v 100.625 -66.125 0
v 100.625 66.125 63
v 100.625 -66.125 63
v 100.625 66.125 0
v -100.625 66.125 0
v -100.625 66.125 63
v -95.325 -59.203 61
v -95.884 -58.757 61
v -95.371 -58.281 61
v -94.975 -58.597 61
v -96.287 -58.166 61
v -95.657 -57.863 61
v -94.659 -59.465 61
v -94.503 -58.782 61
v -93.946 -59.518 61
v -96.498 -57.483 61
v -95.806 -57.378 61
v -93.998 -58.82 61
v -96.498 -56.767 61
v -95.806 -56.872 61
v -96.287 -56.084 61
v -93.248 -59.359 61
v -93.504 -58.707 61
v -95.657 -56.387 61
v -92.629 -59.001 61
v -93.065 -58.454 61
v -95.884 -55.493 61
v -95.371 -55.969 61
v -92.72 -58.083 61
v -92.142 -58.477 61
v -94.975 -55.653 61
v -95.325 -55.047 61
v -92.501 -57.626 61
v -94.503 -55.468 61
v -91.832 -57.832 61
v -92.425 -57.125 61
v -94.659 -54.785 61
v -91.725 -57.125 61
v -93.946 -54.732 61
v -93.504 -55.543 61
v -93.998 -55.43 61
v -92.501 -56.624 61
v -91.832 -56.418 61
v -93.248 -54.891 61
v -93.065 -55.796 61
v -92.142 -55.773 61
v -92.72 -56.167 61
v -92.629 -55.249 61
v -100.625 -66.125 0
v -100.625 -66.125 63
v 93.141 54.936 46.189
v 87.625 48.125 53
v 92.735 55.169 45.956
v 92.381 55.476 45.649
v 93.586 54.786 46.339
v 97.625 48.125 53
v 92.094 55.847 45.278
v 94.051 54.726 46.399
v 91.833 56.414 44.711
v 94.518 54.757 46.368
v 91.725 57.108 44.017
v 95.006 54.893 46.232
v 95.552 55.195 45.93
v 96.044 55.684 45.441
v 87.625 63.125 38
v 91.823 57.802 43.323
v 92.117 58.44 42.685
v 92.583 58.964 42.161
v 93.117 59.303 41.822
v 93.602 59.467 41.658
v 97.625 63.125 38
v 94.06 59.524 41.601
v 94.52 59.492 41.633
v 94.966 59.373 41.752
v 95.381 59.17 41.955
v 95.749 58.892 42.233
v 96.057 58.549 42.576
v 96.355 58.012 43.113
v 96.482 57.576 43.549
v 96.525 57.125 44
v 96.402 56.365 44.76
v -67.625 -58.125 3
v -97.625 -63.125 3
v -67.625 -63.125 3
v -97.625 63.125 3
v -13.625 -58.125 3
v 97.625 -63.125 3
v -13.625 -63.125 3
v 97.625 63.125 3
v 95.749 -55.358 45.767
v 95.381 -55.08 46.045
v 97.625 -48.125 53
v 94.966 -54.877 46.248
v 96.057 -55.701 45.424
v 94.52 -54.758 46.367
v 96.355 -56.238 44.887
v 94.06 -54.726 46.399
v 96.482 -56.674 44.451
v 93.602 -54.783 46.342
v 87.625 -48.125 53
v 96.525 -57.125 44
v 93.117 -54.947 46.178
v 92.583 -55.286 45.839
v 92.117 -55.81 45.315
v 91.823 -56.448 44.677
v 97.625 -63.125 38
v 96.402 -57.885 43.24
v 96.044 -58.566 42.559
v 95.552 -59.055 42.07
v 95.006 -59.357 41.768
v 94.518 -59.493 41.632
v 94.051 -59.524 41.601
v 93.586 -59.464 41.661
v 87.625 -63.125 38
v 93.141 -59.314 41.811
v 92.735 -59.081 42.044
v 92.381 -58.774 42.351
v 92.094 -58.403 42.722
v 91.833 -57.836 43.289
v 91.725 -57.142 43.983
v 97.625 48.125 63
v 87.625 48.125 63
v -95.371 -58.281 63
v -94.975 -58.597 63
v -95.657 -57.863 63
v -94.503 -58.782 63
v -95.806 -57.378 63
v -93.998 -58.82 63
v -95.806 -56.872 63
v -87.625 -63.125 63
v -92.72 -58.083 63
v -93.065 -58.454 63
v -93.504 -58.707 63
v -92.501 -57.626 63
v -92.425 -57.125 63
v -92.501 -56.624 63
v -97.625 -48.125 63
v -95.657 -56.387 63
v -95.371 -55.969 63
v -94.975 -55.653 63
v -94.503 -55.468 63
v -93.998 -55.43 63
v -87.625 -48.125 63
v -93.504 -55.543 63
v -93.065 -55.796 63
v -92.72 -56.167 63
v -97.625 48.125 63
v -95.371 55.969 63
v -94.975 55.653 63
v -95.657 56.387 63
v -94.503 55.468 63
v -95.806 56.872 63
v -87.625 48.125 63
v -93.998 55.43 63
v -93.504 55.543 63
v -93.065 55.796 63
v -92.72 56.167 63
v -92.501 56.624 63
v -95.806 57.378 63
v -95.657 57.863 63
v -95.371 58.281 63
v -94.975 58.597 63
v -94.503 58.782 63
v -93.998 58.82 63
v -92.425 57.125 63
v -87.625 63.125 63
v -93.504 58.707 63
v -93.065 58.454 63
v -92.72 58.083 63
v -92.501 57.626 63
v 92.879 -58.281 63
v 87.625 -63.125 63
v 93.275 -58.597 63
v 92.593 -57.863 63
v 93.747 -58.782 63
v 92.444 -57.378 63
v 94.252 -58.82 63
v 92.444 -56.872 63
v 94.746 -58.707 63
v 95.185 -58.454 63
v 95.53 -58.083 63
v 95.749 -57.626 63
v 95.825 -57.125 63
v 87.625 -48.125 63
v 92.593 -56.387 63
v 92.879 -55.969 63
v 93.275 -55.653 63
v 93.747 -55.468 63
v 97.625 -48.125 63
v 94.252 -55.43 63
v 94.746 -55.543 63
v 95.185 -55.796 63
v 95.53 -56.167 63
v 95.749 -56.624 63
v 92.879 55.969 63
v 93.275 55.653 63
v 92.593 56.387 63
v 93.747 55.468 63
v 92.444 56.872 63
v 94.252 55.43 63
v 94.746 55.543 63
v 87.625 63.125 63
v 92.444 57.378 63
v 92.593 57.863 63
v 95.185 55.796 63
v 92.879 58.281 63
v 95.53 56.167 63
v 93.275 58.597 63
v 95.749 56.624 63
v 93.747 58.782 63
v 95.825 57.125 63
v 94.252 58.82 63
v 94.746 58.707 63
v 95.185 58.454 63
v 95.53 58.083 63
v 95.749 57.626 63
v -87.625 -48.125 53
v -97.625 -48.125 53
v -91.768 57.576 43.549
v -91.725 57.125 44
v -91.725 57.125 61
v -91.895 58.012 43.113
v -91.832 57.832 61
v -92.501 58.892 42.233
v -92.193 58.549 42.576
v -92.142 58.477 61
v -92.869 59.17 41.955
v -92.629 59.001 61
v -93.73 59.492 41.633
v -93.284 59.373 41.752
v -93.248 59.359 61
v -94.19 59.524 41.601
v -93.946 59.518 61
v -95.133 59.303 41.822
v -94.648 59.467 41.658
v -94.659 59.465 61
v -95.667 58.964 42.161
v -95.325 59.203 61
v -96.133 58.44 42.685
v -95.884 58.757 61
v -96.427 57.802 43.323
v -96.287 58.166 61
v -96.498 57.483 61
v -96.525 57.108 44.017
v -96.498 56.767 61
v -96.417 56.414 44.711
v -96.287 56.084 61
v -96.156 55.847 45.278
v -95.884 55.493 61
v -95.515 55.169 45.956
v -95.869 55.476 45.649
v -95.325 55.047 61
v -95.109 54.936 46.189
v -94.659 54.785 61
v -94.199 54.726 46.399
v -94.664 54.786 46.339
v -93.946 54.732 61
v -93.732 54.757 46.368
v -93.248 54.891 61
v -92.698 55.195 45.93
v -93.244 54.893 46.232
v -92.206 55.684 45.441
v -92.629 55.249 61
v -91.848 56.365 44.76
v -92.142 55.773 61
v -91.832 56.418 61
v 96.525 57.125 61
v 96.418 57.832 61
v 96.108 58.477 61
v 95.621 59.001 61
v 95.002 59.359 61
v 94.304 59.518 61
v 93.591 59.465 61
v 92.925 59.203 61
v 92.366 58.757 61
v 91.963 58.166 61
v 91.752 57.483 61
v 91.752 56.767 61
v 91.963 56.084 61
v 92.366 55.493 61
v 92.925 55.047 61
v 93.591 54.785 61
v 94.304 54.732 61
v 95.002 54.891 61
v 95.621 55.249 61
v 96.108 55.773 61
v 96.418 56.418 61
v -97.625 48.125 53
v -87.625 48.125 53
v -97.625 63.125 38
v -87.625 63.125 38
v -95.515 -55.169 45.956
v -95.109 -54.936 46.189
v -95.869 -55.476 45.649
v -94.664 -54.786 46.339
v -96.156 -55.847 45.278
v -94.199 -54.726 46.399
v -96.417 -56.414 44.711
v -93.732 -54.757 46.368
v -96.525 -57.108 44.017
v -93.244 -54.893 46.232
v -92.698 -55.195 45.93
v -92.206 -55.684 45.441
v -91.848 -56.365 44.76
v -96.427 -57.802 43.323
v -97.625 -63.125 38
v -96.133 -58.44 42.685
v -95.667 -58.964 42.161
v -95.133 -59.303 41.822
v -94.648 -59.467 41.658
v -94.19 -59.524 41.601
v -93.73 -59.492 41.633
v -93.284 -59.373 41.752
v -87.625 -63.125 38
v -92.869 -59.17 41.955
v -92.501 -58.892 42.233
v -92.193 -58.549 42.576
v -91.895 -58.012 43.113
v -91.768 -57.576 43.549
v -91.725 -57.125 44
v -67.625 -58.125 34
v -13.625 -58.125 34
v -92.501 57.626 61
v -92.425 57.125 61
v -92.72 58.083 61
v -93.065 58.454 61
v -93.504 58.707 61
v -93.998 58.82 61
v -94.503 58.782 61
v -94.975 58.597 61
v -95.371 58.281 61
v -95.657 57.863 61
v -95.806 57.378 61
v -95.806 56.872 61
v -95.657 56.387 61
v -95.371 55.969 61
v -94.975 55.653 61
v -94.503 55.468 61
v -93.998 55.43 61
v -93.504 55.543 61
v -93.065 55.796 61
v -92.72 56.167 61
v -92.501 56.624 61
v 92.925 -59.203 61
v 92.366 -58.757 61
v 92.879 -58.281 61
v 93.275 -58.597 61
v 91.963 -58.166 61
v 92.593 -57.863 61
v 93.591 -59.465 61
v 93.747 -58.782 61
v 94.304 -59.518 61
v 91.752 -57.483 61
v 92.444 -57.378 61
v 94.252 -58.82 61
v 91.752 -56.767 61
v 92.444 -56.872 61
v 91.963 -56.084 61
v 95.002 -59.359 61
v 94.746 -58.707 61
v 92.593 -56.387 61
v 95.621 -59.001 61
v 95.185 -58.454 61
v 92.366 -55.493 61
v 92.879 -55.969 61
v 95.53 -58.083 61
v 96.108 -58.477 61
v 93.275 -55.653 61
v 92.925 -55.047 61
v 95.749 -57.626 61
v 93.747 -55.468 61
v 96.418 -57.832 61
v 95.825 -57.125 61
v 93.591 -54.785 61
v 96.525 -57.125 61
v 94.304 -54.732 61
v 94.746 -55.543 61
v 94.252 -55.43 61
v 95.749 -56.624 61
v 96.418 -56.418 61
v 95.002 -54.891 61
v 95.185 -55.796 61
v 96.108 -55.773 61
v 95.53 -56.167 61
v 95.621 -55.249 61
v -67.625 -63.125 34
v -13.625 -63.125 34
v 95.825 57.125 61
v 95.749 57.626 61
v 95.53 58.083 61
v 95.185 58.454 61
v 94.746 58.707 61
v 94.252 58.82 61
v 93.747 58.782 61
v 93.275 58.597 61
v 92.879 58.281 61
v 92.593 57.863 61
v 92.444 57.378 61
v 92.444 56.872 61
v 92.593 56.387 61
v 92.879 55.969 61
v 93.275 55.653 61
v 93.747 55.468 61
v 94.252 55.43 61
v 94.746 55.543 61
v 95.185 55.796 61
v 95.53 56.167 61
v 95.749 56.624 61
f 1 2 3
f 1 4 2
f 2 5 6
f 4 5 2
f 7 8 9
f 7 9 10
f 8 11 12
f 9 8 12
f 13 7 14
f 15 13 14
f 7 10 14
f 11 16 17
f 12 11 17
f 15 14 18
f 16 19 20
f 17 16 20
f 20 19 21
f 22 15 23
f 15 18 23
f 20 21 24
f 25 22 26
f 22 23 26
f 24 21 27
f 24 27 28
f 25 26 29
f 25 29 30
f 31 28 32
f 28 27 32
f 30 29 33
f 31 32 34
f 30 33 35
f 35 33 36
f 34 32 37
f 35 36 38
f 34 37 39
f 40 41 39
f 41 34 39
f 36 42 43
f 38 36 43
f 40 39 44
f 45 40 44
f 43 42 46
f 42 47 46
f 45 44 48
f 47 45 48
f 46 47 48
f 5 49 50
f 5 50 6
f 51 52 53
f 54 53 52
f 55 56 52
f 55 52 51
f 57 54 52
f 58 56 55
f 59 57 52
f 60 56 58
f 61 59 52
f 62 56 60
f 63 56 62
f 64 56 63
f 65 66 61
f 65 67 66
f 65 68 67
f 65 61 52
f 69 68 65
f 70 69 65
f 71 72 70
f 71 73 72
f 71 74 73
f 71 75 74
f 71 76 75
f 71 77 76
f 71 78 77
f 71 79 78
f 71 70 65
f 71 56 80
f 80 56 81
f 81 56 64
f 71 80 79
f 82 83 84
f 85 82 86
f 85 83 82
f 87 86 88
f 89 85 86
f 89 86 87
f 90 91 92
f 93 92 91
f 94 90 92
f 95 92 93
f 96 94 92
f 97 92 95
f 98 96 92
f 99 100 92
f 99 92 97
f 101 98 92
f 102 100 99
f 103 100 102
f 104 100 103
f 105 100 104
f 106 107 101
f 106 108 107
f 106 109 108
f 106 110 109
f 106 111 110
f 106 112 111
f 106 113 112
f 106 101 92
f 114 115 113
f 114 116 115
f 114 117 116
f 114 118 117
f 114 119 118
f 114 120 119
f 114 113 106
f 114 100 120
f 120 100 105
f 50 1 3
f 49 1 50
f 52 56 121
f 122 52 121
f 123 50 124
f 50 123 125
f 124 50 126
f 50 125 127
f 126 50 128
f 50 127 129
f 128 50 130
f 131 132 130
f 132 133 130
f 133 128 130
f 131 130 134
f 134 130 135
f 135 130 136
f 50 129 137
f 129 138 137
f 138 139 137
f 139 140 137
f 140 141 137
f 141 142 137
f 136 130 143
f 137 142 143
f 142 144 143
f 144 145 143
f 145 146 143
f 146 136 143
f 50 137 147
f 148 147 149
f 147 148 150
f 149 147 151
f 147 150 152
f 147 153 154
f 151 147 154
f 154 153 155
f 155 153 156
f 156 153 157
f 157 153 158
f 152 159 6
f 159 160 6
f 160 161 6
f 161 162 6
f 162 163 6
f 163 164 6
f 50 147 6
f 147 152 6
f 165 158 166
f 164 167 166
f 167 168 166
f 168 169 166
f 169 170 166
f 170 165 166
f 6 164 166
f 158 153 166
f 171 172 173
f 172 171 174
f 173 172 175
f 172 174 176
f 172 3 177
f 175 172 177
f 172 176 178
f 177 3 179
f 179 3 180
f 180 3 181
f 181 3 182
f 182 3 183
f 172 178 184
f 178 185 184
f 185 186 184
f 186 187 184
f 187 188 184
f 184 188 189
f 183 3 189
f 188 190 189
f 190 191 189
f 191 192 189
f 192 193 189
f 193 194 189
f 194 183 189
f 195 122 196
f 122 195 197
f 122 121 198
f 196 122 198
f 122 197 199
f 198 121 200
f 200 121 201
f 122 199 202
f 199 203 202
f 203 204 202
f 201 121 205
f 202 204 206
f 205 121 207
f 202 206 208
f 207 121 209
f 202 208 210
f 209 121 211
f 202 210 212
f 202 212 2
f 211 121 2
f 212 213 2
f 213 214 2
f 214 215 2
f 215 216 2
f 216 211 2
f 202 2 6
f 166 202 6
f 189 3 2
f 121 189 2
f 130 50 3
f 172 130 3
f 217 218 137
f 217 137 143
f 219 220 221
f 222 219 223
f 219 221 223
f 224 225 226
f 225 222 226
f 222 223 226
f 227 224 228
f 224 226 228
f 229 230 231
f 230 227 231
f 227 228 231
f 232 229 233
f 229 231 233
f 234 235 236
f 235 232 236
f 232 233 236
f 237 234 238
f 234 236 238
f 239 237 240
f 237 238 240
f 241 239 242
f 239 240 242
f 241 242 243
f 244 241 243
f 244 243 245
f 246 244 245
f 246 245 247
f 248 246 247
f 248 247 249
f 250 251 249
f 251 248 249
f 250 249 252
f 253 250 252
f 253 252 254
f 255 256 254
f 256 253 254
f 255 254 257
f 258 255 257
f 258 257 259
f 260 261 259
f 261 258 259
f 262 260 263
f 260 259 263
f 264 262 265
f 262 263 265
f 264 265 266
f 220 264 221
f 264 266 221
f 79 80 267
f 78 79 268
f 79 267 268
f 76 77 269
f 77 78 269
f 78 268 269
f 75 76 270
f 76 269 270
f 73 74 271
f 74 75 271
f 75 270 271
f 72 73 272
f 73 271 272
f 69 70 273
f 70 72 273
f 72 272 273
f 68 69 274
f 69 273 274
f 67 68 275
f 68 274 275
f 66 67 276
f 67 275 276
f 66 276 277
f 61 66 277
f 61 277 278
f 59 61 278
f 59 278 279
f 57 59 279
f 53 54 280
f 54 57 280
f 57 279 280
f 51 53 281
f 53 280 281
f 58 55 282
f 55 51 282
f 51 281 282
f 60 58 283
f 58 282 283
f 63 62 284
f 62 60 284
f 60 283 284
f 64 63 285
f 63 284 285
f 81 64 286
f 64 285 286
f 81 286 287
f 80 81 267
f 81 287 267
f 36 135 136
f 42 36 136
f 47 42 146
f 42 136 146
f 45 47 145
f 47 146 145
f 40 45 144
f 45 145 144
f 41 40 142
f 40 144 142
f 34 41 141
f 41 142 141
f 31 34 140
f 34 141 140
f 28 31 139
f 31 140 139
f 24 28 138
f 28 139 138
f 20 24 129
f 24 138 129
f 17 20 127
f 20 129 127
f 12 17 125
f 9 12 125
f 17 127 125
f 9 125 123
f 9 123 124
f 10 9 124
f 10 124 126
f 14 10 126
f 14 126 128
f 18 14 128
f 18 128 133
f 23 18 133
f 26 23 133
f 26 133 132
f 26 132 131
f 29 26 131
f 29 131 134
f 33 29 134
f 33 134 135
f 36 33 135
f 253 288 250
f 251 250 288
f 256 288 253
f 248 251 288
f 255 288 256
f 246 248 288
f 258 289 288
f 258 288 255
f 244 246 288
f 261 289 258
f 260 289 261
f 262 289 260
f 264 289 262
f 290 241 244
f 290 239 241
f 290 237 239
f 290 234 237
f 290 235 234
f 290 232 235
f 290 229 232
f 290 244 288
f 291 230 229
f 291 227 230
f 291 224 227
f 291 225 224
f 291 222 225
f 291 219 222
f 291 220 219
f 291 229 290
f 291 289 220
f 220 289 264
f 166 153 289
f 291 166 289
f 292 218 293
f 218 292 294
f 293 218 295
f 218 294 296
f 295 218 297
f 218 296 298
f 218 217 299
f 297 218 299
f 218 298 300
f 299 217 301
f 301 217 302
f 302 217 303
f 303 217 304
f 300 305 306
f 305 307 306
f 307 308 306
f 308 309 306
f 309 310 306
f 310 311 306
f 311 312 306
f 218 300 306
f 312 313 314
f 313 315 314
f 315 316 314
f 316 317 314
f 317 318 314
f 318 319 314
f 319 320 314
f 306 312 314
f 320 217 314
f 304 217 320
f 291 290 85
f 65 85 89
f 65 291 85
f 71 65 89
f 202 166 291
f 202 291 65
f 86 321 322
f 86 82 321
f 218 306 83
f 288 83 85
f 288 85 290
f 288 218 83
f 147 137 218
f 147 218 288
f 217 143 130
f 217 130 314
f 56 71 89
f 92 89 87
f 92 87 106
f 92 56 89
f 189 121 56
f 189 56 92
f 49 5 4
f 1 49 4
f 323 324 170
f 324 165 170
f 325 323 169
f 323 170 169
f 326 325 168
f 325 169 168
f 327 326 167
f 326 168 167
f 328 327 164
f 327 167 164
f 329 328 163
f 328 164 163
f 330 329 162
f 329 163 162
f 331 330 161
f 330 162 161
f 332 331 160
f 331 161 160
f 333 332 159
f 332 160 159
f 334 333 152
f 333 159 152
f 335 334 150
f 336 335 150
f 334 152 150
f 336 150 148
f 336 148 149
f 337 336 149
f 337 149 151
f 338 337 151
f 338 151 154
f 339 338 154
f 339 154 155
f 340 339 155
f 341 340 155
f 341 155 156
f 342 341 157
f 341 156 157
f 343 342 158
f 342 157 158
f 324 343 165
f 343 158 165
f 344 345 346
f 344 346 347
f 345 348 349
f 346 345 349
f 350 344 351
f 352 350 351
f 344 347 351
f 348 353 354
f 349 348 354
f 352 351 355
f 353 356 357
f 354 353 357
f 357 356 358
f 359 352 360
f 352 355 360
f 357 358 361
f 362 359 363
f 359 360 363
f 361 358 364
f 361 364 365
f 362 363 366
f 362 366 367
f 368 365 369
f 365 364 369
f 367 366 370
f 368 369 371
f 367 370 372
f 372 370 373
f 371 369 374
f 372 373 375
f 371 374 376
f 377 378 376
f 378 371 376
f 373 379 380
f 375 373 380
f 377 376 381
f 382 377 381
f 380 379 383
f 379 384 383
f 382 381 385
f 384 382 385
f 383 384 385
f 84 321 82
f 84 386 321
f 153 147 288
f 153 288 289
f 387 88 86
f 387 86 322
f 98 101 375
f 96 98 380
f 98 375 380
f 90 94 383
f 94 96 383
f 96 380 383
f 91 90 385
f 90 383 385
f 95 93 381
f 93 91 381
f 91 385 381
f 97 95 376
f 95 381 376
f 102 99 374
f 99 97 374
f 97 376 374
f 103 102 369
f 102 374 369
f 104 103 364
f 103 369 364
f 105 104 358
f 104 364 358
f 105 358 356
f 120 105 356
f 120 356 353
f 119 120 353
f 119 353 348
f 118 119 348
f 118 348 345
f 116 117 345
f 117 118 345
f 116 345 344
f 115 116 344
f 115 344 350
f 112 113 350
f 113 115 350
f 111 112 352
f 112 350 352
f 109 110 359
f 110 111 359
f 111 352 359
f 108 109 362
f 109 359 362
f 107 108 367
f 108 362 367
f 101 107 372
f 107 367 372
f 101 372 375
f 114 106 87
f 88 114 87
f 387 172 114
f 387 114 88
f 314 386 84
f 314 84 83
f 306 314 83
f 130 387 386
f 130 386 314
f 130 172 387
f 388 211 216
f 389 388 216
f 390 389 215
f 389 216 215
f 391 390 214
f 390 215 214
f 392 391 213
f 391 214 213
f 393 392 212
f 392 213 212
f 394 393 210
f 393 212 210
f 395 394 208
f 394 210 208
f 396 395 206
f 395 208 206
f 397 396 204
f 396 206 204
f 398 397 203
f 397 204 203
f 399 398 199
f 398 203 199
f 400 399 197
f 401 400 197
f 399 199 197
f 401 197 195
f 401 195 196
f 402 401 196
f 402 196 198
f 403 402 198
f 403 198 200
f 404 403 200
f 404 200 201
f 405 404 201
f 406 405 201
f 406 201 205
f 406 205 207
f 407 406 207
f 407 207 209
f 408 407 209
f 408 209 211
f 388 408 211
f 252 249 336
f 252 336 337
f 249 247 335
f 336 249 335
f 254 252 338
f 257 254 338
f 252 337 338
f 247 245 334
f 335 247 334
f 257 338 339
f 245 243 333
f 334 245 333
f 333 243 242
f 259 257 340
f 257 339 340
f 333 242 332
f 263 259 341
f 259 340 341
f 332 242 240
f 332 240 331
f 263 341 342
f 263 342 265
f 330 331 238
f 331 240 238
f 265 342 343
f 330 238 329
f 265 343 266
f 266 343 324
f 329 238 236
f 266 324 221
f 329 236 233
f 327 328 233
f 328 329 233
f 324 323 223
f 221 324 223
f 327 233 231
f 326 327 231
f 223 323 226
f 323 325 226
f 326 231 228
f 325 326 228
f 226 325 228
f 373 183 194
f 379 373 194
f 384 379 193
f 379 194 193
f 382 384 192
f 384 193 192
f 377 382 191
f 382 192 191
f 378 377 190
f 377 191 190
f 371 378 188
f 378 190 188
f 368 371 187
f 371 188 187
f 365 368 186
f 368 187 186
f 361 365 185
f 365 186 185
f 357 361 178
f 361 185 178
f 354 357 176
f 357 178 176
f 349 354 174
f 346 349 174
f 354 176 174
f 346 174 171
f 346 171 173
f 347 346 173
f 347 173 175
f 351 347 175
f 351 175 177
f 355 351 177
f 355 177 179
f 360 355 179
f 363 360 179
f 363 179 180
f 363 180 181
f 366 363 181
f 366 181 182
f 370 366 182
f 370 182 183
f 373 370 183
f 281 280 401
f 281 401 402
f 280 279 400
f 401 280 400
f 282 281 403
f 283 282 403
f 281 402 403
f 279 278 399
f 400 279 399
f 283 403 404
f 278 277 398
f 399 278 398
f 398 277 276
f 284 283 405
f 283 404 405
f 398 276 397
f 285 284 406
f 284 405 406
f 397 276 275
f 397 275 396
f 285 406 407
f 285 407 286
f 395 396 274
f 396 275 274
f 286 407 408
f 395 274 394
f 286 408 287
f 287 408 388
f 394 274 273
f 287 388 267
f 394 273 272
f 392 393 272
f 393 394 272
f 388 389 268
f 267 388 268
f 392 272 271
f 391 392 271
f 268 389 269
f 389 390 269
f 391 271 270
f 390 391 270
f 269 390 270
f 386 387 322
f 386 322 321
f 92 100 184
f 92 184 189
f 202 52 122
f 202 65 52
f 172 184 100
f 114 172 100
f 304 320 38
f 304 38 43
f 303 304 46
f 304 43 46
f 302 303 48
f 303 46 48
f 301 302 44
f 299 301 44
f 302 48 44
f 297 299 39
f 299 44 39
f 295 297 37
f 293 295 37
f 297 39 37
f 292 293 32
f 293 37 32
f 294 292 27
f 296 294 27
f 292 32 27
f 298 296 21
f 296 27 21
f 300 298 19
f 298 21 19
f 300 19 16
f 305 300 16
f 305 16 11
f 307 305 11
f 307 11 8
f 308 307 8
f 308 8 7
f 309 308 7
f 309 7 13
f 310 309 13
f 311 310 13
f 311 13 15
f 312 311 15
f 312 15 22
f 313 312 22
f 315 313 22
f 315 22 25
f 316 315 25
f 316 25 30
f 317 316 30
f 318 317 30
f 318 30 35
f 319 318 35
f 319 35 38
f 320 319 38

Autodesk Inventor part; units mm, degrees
ref_plane "YZ Plane" through (0, 0, 0) normal (1, 0, 0) x (0, 1, 0)
ref_plane "XZ Plane" through (0, 0, 0) normal (0, 1, 0) x (-1, 0, 0)
ref_plane "XY Plane" through (0, 0, 0) normal (0, 0, 1) x (1, 0, 0)
sketch "Sketch7" plane through (0, 0, 0) normal (0, 0, 1) x (1, 0, 0)
  line L0 (100.625, -66.125) -> (-100.625, -66.125)
  line L1 (-100.625, -66.125) -> (-100.625, 66.125)
  line L2 (-100.625, 66.125) -> (100.625, 66.125)
  line L3 (100.625, 66.125) -> (100.625, -66.125)
  line L4 (100.625, -66.125) -> (-100.625, 66.125) construction
  line L5 (-100.625, -66.125) -> (100.625, 66.125) construction
  point P0 (0, 0)
  dimension "d15" = 201.25
  dimension "d16" = 132.25
extrude "Box Outside" add sketch "Sketch7" along normal blind 63
sketch "Sketch8" plane through (0, 0, 63) normal (0, 0, 1) x (1, 0, 0)
  line L0 (-97.625, 63.125) -> (97.625, 63.125)
  line L1 (97.625, 63.125) -> (97.625, -63.125)
  line L2 (97.625, -63.125) -> (-97.625, -63.125)
  line L3 (-97.625, -63.125) -> (-97.625, 63.125)
  line L4 (100.625, 66.125) -> (-100.625, 66.125) projected
  line L5 (-100.625, 66.125) -> (-100.625, -66.125) projected
  line L6 (-100.625, -66.125) -> (100.625, -66.125) projected
  line L7 (100.625, -66.125) -> (100.625, 66.125) projected
  point P0 (0, 0)
  dimension "d19" = 3
  dimension "d20" = 3
  dimension "d21" = 3
  dimension "d22" = 3
extrude "Box Cut" cut sketch "Sketch8" against normal blind 60 contours L0 L1 L2 L3
sketch "Sketch9" plane through (-97.625, -63.125, 63) normal (0, 1, 0) x (1, 0, 0)
  line L0 (0, 0) -> (10, 0)
  line L1 (10, 0) -> (10, 25)
  line L2 (10, 25) -> (0, 25)
  line L3 (0, 25) -> (0, 0)
  point P0 (97.625, 63)
  dimension "d25" = 10
  dimension "d26" = 25
extrude "ScrewHole Box LB" add sketch "Sketch9" along normal blind 15
sketch "Sketch10" plane through (-97.625, -63.125, 3) normal (0, 1, 0) x (1, 0, 0)
  line L0 (195.25, -60) -> (195.25, 0) projected
  line L1 (195.25, -60) -> (185.25, -60)
  line L2 (185.25, -60) -> (185.25, -35)
  line L3 (185.25, -35) -> (195.25, -35)
  line L4 (195.25, -35) -> (195.25, -60)
  point P0 (97.625, 3)
  dimension "d29" = 10
  dimension "d30" = 25
extrude "ScrewHole Box RB" add sketch "Sketch10" along normal blind 15
sketch "Sketch11" plane through (-97.625, 63.125, 63) normal (0, -1, 0) x (1, 0, 0)
  line L0 (0, 0) -> (195.25, 0) projected
  line L1 (0, 0) -> (10, 0)
  line L2 (10, 0) -> (10, -25)
  line L3 (10, -25) -> (0, -25)
  line L4 (0, -25) -> (0, 0)
  point P0 (97.625, -63)
  dimension "d33" = 10
  dimension "d34" = 25
extrude "ScrewHole Box LU" add sketch "Sketch11" along normal blind 15
sketch "Sketch13" plane through (97.625, -63.125, 3) normal (-1, 0, 0) x (0, 0, 1)
  line L0 (60, 126.25) -> (0, 126.25) projected
  line L1 (60, 126.25) -> (35, 126.25)
  line L2 (35, 126.25) -> (35, 111.25)
  line L3 (35, 111.25) -> (60, 111.25)
  line L4 (60, 111.25) -> (60, 126.25)
  point P0 (-3, 63.125)
  dimension "d37" = 25
  dimension "d38" = 15
extrude "ScrewHole Box RU" add sketch "Sketch13" along normal blind 10
sketch "Sketch27" plane through (0, 0, 63) normal (0, 0, 1) x (1, 0, 0)
  line L0 (-87.625, -63.125) -> (-87.625, -48.125) projected
  line L1 (-100.625, 66.125) -> (-100.625, -66.125) projected
  line L2 (-87.625, -48.125) -> (-100.625, -48.125)
  line L3 (-100.625, -48.125) -> (-100.625, -66.125)
  line L4 (-100.625, -66.125) -> (-87.625, -66.125)
  line L5 (-87.625, -66.125) -> (-87.625, -48.125)
  line L6 (-87.625, -48.125) -> (-100.625, -66.125)
  line L7 (-87.625, -66.125) -> (-100.625, -48.125)
  circle A0 centre (-94.125, -57.125) radius 2.4
  point P0 (0, 0)
  dimension "d84" = 4.8
extrude "Outside ScrewHole LB" cut sketch "Sketch27" against normal blind 26 contours A0 L7 L6 | L6 L7 A0 | A0 L6 L7 | L7 L6 A0
sketch "Sketch29" plane through (0, 0, 63) normal (0, 0, 1) x (1, 0, 0)
  line L0 (-87.625, -63.125) -> (-87.625, -48.125) projected
  line L1 (-100.625, -66.125) -> (100.625, -66.125) projected
  line L2 (-87.625, -48.125) -> (-100.625, -48.125)
  line L3 (-100.625, -48.125) -> (-100.625, -66.125)
  line L4 (-100.625, -66.125) -> (-87.625, -66.125)
  line L5 (-87.625, -66.125) -> (-87.625, -48.125)
  line L6 (-87.625, -48.125) -> (-100.625, -66.125)
  circle A0 centre (-94.125, -57.125) radius 2.4
  point P0 (0, 0)
extrude "ScrewRibbon LB" add sketch "Sketch29" against normal blind 2 contours A0 L6 | L6 A0
sketch "Sketch30" plane through (0, 0, 63) normal (0, 0, 1) x (1, 0, 0)
  line L0 (-97.625, -48.125) -> (-87.625, -48.125) projected
  line L1 (-100.625, -66.125) -> (100.625, -66.125) projected
  line L2 (-87.625, -48.125) -> (-100.625, -48.125)
  line L3 (-100.625, -48.125) -> (-100.625, -66.125)
  line L4 (-100.625, -66.125) -> (-87.625, -66.125)
  line L5 (-87.625, -66.125) -> (-87.625, -48.125)
  line L6 (-87.625, -48.125) -> (-100.625, -66.125)
  circle A0 centre (-94.125, -57.125) radius 1.7
  point P0 (0, 0)
  dimension "d92" = 3.4
extrude "Inside ScrewHole LB" cut sketch "Sketch30" against normal blind 24 contours A0 L6 | L6 A0
sketch "Sketch31" plane through (0, 0, 63) normal (0, 0, 1) x (1, 0, 0)
  line L0 (-100.625, 66.125) -> (-100.625, -66.125) projected
  line L1 (-87.625, 48.125) -> (-97.625, 48.125) projected
  line L2 (-100.625, 66.125) -> (-87.625, 66.125)
  line L3 (-87.625, 66.125) -> (-87.625, 48.125)
  line L4 (-87.625, 48.125) -> (-100.625, 48.125)
  line L5 (-100.625, 48.125) -> (-100.625, 66.125)
  line L6 (-100.625, 66.125) -> (-87.625, 48.125)
  circle A0 centre (-94.125, 57.125) radius 2.4
  point P0 (0, 0)
  dimension "d95" = 4.8
extrude "Outside ScrewHole LU" cut sketch "Sketch31" against normal blind 24 contours A0 L6 | L6 A0
sketch "Sketch32" plane through (0, 0, 63) normal (0, 0, 1) x (1, 0, 0)
  line L0 (-97.625, 48.125) -> (-87.625, 48.125) projected
  line L1 (-100.625, 66.125) -> (-100.625, -66.125) projected
  line L2 (-87.625, 48.125) -> (-100.625, 48.125)
  line L3 (-100.625, 48.125) -> (-100.625, 66.125)
  line L4 (-100.625, 66.125) -> (-87.625, 66.125)
  line L5 (-87.625, 66.125) -> (-87.625, 48.125)
  line L6 (-87.625, 66.125) -> (-100.625, 48.125)
  circle A0 centre (-94.125, 57.125) radius 2.4
  point P0 (0, 0)
  dimension "d98" = 4.8
extrude "ScrewRibbon LU" add sketch "Sketch32" against normal blind 2 contours A0 L6 | L6 A0
sketch "Sketch33" plane through (0, 0, 63) normal (0, 0, 1) x (1, 0, 0)
  line L0 (100.625, 66.125) -> (-100.625, 66.125) projected
  line L1 (-87.625, 48.125) -> (-97.625, 48.125) projected
  line L2 (-100.625, 66.125) -> (-87.625, 66.125)
  line L3 (-87.625, 66.125) -> (-87.625, 48.125)
  line L4 (-87.625, 48.125) -> (-100.625, 48.125)
  line L5 (-100.625, 48.125) -> (-100.625, 66.125)
  line L6 (-100.625, 66.125) -> (-87.625, 48.125)
  circle A0 centre (-94.125, 57.125) radius 1.7
  point P0 (0, 0)
  dimension "d101" = 3.4
extrude "Inside ScrewHole LU" cut sketch "Sketch33" against normal blind 21.75 contours A0 L6 | L6 A0
sketch "Sketch34" plane through (0, 0, 63) normal (0, 0, 1) x (1, 0, 0)
  line L0 (87.625, 48.125) -> (87.625, 63.125) projected
  line L1 (100.625, 66.125) -> (-100.625, 66.125) projected
  line L2 (87.625, 48.125) -> (100.625, 48.125)
  line L3 (100.625, 48.125) -> (100.625, 66.125)
  line L4 (100.625, 66.125) -> (87.625, 66.125)
  line L5 (87.625, 66.125) -> (87.625, 48.125)
  line L6 (100.625, 66.125) -> (87.625, 48.125)
  circle A0 centre (94.125, 57.125) radius 2.4
  point P0 (0, 0)
  dimension "d104" = 4.8
extrude "Outside ScrewHole RU" cut sketch "Sketch34" against normal blind 37 contours A0 L6 | L6 A0
sketch "Sketch35" plane through (0, 0, 63) normal (0, 0, 1) x (1, 0, 0)
  line L0 (100.625, -66.125) -> (100.625, 66.125) projected
  line L1 (97.625, 48.125) -> (87.625, 48.125) projected
  line L2 (100.625, 66.125) -> (87.625, 66.125)
  line L3 (87.625, 66.125) -> (87.625, 48.125)
  line L4 (87.625, 48.125) -> (100.625, 48.125)
  line L5 (100.625, 48.125) -> (100.625, 66.125)
  line L6 (100.625, 66.125) -> (-100.625, 66.125) projected
  line L7 (100.625, 66.125) -> (87.625, 48.125)
  circle A0 centre (94.125, 57.125) radius 2.4
  point P0 (0, 0)
  dimension "d107" = 4.8
extrude "ScrewRibbon RU" add sketch "Sketch35" against normal blind 2 contours A0 L7 | L7 A0
sketch "Sketch36" plane through (0, 0, 63) normal (0, 0, 1) x (1, 0, 0)
  line L0 (97.625, 48.125) -> (87.625, 48.125) projected
  line L1 (100.625, -66.125) -> (100.625, 66.125) projected
  line L2 (87.625, 48.125) -> (100.625, 48.125)
  line L3 (100.625, 48.125) -> (100.625, 66.125)
  line L4 (100.625, 66.125) -> (87.625, 66.125)
  line L5 (87.625, 66.125) -> (87.625, 48.125)
  line L6 (87.625, 48.125) -> (100.625, 66.125)
  circle A0 centre (94.125, 57.125) radius 2.4 projected
  circle A1 centre (94.125, 57.125) radius 1.7
  point P0 (0, 0)
  dimension "d110" = 3.4
extrude "Inside ScrewHole RU" cut sketch "Sketch36" against normal blind 20 contours A1 L6 | L6 A1
sketch "Sketch37" plane through (0, 0, 63) normal (0, 0, 1) x (1, 0, 0)
  line L0 (100.625, -66.125) -> (100.625, 66.125) projected
  line L1 (87.625, -63.125) -> (87.625, -48.125) projected
  line L2 (100.625, -66.125) -> (87.625, -66.125)
  line L3 (87.625, -66.125) -> (87.625, -48.125)
  line L4 (87.625, -48.125) -> (100.625, -48.125)
  line L5 (100.625, -48.125) -> (100.625, -66.125)
  line L6 (87.625, -66.125) -> (100.625, -48.125)
  circle A0 centre (94.125, -57.125) radius 2.4
  point P0 (0, 0)
  dimension "d113" = 4.8
extrude "Outside ScrewHole RB" cut sketch "Sketch37" against normal blind 27.5 contours A0 L6 | L6 A0
sketch "Sketch38" plane through (0, 0, 63) normal (0, 0, 1) x (1, 0, 0)
  line L0 (97.625, -48.125) -> (87.625, -48.125) projected
  line L1 (100.625, -66.125) -> (100.625, 66.125) projected
  line L2 (87.625, -48.125) -> (100.625, -48.125)
  line L3 (100.625, -48.125) -> (100.625, -66.125)
  line L4 (100.625, -66.125) -> (87.625, -66.125)
  line L5 (87.625, -66.125) -> (87.625, -48.125)
  line L6 (100.625, -48.125) -> (87.625, -66.125)
  circle A0 centre (94.125, -57.125) radius 2.4
  point P0 (0, 0)
  dimension "d116" = 4.8
extrude "ScrewRibbon RB" add sketch "Sketch38" against normal blind 2 contours A0 L6 | L6 A0
sketch "Sketch39" plane through (0, 0, 63) normal (0, 0, 1) x (1, 0, 0)
  line L0 (87.625, -63.125) -> (87.625, -48.125) projected
  line L1 (100.625, -66.125) -> (100.625, 66.125) projected
  line L2 (87.625, -48.125) -> (100.625, -48.125)
  line L3 (100.625, -48.125) -> (100.625, -66.125)
  line L4 (100.625, -66.125) -> (87.625, -66.125)
  line L5 (87.625, -66.125) -> (87.625, -48.125)
  line L6 (87.625, -66.125) -> (100.625, -48.125)
  circle A0 centre (94.125, -57.125) radius 2.4 projected
  circle A1 centre (94.125, -57.125) radius 1.7
  point P0 (0, 0)
  dimension "d119" = 3.4
extrude "Inside ScrewHole RB" cut sketch "Sketch39" against normal blind 20 contours A1 L6 | L6 A1
sketch "Sketch42" plane through (-97.625, -63.125, 3) normal (0, 1, 0) x (1, 0, 0)
  line L0 (195.25, 0) -> (0, 0) projected
  line L1 (30, 0) -> (84, 0)
  line L2 (84, 0) -> (84, -31)
  line L3 (84, -31) -> (30, -31)
  line L4 (30, -31) -> (30, 0)
  line L5 (0, -35) -> (0, 0) projected
  line L6 (195.25, -35) -> (195.25, 0) projected
  point P0 (97.625, 3)
  dimension "d134" = 54
  dimension "d135" = 31
  dimension "d197" = 111.25
extrude "ESPHolder" add sketch "Sketch42" along normal blind 5
chamfer "Chamfer1" distance 15 angle 45 1 edges at (-92.625, -48.125, 38)
chamfer "Chamfer2" distance 15 angle 45 1 edges at (-92.625, 48.125, 38)
chamfer "Chamfer3" distance 15 angle 45 1 edges at (92.625, 48.125, 38)
chamfer "Chamfer4" distance 15 angle 45 1 edges at (92.625, -48.125, 38)
properties part number "Box2"
